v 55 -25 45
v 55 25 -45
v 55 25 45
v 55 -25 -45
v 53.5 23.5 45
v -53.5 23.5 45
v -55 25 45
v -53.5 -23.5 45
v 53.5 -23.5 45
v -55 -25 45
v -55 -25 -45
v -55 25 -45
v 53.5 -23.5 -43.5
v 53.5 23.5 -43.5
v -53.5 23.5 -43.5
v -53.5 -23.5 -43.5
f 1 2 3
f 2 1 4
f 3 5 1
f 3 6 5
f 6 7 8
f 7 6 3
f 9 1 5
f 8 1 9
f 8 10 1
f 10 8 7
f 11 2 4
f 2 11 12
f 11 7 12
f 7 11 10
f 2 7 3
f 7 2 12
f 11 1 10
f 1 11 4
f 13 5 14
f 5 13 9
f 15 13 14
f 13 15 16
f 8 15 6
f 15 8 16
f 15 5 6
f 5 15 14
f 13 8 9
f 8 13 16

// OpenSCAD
// ========================================
// a 11 x 5 x 9 cm enclosure with 0.15 cm wall thickness
// NeuroCAD canonical IR; dimensions are millimetres
// ========================================
$fn = 48;

difference() {
  cube(size=[110, 50, 90], center=true);
  translate([0, 0, 0.85]) {
    cube(size=[107, 47, 88.7], center=true);
  }
}
